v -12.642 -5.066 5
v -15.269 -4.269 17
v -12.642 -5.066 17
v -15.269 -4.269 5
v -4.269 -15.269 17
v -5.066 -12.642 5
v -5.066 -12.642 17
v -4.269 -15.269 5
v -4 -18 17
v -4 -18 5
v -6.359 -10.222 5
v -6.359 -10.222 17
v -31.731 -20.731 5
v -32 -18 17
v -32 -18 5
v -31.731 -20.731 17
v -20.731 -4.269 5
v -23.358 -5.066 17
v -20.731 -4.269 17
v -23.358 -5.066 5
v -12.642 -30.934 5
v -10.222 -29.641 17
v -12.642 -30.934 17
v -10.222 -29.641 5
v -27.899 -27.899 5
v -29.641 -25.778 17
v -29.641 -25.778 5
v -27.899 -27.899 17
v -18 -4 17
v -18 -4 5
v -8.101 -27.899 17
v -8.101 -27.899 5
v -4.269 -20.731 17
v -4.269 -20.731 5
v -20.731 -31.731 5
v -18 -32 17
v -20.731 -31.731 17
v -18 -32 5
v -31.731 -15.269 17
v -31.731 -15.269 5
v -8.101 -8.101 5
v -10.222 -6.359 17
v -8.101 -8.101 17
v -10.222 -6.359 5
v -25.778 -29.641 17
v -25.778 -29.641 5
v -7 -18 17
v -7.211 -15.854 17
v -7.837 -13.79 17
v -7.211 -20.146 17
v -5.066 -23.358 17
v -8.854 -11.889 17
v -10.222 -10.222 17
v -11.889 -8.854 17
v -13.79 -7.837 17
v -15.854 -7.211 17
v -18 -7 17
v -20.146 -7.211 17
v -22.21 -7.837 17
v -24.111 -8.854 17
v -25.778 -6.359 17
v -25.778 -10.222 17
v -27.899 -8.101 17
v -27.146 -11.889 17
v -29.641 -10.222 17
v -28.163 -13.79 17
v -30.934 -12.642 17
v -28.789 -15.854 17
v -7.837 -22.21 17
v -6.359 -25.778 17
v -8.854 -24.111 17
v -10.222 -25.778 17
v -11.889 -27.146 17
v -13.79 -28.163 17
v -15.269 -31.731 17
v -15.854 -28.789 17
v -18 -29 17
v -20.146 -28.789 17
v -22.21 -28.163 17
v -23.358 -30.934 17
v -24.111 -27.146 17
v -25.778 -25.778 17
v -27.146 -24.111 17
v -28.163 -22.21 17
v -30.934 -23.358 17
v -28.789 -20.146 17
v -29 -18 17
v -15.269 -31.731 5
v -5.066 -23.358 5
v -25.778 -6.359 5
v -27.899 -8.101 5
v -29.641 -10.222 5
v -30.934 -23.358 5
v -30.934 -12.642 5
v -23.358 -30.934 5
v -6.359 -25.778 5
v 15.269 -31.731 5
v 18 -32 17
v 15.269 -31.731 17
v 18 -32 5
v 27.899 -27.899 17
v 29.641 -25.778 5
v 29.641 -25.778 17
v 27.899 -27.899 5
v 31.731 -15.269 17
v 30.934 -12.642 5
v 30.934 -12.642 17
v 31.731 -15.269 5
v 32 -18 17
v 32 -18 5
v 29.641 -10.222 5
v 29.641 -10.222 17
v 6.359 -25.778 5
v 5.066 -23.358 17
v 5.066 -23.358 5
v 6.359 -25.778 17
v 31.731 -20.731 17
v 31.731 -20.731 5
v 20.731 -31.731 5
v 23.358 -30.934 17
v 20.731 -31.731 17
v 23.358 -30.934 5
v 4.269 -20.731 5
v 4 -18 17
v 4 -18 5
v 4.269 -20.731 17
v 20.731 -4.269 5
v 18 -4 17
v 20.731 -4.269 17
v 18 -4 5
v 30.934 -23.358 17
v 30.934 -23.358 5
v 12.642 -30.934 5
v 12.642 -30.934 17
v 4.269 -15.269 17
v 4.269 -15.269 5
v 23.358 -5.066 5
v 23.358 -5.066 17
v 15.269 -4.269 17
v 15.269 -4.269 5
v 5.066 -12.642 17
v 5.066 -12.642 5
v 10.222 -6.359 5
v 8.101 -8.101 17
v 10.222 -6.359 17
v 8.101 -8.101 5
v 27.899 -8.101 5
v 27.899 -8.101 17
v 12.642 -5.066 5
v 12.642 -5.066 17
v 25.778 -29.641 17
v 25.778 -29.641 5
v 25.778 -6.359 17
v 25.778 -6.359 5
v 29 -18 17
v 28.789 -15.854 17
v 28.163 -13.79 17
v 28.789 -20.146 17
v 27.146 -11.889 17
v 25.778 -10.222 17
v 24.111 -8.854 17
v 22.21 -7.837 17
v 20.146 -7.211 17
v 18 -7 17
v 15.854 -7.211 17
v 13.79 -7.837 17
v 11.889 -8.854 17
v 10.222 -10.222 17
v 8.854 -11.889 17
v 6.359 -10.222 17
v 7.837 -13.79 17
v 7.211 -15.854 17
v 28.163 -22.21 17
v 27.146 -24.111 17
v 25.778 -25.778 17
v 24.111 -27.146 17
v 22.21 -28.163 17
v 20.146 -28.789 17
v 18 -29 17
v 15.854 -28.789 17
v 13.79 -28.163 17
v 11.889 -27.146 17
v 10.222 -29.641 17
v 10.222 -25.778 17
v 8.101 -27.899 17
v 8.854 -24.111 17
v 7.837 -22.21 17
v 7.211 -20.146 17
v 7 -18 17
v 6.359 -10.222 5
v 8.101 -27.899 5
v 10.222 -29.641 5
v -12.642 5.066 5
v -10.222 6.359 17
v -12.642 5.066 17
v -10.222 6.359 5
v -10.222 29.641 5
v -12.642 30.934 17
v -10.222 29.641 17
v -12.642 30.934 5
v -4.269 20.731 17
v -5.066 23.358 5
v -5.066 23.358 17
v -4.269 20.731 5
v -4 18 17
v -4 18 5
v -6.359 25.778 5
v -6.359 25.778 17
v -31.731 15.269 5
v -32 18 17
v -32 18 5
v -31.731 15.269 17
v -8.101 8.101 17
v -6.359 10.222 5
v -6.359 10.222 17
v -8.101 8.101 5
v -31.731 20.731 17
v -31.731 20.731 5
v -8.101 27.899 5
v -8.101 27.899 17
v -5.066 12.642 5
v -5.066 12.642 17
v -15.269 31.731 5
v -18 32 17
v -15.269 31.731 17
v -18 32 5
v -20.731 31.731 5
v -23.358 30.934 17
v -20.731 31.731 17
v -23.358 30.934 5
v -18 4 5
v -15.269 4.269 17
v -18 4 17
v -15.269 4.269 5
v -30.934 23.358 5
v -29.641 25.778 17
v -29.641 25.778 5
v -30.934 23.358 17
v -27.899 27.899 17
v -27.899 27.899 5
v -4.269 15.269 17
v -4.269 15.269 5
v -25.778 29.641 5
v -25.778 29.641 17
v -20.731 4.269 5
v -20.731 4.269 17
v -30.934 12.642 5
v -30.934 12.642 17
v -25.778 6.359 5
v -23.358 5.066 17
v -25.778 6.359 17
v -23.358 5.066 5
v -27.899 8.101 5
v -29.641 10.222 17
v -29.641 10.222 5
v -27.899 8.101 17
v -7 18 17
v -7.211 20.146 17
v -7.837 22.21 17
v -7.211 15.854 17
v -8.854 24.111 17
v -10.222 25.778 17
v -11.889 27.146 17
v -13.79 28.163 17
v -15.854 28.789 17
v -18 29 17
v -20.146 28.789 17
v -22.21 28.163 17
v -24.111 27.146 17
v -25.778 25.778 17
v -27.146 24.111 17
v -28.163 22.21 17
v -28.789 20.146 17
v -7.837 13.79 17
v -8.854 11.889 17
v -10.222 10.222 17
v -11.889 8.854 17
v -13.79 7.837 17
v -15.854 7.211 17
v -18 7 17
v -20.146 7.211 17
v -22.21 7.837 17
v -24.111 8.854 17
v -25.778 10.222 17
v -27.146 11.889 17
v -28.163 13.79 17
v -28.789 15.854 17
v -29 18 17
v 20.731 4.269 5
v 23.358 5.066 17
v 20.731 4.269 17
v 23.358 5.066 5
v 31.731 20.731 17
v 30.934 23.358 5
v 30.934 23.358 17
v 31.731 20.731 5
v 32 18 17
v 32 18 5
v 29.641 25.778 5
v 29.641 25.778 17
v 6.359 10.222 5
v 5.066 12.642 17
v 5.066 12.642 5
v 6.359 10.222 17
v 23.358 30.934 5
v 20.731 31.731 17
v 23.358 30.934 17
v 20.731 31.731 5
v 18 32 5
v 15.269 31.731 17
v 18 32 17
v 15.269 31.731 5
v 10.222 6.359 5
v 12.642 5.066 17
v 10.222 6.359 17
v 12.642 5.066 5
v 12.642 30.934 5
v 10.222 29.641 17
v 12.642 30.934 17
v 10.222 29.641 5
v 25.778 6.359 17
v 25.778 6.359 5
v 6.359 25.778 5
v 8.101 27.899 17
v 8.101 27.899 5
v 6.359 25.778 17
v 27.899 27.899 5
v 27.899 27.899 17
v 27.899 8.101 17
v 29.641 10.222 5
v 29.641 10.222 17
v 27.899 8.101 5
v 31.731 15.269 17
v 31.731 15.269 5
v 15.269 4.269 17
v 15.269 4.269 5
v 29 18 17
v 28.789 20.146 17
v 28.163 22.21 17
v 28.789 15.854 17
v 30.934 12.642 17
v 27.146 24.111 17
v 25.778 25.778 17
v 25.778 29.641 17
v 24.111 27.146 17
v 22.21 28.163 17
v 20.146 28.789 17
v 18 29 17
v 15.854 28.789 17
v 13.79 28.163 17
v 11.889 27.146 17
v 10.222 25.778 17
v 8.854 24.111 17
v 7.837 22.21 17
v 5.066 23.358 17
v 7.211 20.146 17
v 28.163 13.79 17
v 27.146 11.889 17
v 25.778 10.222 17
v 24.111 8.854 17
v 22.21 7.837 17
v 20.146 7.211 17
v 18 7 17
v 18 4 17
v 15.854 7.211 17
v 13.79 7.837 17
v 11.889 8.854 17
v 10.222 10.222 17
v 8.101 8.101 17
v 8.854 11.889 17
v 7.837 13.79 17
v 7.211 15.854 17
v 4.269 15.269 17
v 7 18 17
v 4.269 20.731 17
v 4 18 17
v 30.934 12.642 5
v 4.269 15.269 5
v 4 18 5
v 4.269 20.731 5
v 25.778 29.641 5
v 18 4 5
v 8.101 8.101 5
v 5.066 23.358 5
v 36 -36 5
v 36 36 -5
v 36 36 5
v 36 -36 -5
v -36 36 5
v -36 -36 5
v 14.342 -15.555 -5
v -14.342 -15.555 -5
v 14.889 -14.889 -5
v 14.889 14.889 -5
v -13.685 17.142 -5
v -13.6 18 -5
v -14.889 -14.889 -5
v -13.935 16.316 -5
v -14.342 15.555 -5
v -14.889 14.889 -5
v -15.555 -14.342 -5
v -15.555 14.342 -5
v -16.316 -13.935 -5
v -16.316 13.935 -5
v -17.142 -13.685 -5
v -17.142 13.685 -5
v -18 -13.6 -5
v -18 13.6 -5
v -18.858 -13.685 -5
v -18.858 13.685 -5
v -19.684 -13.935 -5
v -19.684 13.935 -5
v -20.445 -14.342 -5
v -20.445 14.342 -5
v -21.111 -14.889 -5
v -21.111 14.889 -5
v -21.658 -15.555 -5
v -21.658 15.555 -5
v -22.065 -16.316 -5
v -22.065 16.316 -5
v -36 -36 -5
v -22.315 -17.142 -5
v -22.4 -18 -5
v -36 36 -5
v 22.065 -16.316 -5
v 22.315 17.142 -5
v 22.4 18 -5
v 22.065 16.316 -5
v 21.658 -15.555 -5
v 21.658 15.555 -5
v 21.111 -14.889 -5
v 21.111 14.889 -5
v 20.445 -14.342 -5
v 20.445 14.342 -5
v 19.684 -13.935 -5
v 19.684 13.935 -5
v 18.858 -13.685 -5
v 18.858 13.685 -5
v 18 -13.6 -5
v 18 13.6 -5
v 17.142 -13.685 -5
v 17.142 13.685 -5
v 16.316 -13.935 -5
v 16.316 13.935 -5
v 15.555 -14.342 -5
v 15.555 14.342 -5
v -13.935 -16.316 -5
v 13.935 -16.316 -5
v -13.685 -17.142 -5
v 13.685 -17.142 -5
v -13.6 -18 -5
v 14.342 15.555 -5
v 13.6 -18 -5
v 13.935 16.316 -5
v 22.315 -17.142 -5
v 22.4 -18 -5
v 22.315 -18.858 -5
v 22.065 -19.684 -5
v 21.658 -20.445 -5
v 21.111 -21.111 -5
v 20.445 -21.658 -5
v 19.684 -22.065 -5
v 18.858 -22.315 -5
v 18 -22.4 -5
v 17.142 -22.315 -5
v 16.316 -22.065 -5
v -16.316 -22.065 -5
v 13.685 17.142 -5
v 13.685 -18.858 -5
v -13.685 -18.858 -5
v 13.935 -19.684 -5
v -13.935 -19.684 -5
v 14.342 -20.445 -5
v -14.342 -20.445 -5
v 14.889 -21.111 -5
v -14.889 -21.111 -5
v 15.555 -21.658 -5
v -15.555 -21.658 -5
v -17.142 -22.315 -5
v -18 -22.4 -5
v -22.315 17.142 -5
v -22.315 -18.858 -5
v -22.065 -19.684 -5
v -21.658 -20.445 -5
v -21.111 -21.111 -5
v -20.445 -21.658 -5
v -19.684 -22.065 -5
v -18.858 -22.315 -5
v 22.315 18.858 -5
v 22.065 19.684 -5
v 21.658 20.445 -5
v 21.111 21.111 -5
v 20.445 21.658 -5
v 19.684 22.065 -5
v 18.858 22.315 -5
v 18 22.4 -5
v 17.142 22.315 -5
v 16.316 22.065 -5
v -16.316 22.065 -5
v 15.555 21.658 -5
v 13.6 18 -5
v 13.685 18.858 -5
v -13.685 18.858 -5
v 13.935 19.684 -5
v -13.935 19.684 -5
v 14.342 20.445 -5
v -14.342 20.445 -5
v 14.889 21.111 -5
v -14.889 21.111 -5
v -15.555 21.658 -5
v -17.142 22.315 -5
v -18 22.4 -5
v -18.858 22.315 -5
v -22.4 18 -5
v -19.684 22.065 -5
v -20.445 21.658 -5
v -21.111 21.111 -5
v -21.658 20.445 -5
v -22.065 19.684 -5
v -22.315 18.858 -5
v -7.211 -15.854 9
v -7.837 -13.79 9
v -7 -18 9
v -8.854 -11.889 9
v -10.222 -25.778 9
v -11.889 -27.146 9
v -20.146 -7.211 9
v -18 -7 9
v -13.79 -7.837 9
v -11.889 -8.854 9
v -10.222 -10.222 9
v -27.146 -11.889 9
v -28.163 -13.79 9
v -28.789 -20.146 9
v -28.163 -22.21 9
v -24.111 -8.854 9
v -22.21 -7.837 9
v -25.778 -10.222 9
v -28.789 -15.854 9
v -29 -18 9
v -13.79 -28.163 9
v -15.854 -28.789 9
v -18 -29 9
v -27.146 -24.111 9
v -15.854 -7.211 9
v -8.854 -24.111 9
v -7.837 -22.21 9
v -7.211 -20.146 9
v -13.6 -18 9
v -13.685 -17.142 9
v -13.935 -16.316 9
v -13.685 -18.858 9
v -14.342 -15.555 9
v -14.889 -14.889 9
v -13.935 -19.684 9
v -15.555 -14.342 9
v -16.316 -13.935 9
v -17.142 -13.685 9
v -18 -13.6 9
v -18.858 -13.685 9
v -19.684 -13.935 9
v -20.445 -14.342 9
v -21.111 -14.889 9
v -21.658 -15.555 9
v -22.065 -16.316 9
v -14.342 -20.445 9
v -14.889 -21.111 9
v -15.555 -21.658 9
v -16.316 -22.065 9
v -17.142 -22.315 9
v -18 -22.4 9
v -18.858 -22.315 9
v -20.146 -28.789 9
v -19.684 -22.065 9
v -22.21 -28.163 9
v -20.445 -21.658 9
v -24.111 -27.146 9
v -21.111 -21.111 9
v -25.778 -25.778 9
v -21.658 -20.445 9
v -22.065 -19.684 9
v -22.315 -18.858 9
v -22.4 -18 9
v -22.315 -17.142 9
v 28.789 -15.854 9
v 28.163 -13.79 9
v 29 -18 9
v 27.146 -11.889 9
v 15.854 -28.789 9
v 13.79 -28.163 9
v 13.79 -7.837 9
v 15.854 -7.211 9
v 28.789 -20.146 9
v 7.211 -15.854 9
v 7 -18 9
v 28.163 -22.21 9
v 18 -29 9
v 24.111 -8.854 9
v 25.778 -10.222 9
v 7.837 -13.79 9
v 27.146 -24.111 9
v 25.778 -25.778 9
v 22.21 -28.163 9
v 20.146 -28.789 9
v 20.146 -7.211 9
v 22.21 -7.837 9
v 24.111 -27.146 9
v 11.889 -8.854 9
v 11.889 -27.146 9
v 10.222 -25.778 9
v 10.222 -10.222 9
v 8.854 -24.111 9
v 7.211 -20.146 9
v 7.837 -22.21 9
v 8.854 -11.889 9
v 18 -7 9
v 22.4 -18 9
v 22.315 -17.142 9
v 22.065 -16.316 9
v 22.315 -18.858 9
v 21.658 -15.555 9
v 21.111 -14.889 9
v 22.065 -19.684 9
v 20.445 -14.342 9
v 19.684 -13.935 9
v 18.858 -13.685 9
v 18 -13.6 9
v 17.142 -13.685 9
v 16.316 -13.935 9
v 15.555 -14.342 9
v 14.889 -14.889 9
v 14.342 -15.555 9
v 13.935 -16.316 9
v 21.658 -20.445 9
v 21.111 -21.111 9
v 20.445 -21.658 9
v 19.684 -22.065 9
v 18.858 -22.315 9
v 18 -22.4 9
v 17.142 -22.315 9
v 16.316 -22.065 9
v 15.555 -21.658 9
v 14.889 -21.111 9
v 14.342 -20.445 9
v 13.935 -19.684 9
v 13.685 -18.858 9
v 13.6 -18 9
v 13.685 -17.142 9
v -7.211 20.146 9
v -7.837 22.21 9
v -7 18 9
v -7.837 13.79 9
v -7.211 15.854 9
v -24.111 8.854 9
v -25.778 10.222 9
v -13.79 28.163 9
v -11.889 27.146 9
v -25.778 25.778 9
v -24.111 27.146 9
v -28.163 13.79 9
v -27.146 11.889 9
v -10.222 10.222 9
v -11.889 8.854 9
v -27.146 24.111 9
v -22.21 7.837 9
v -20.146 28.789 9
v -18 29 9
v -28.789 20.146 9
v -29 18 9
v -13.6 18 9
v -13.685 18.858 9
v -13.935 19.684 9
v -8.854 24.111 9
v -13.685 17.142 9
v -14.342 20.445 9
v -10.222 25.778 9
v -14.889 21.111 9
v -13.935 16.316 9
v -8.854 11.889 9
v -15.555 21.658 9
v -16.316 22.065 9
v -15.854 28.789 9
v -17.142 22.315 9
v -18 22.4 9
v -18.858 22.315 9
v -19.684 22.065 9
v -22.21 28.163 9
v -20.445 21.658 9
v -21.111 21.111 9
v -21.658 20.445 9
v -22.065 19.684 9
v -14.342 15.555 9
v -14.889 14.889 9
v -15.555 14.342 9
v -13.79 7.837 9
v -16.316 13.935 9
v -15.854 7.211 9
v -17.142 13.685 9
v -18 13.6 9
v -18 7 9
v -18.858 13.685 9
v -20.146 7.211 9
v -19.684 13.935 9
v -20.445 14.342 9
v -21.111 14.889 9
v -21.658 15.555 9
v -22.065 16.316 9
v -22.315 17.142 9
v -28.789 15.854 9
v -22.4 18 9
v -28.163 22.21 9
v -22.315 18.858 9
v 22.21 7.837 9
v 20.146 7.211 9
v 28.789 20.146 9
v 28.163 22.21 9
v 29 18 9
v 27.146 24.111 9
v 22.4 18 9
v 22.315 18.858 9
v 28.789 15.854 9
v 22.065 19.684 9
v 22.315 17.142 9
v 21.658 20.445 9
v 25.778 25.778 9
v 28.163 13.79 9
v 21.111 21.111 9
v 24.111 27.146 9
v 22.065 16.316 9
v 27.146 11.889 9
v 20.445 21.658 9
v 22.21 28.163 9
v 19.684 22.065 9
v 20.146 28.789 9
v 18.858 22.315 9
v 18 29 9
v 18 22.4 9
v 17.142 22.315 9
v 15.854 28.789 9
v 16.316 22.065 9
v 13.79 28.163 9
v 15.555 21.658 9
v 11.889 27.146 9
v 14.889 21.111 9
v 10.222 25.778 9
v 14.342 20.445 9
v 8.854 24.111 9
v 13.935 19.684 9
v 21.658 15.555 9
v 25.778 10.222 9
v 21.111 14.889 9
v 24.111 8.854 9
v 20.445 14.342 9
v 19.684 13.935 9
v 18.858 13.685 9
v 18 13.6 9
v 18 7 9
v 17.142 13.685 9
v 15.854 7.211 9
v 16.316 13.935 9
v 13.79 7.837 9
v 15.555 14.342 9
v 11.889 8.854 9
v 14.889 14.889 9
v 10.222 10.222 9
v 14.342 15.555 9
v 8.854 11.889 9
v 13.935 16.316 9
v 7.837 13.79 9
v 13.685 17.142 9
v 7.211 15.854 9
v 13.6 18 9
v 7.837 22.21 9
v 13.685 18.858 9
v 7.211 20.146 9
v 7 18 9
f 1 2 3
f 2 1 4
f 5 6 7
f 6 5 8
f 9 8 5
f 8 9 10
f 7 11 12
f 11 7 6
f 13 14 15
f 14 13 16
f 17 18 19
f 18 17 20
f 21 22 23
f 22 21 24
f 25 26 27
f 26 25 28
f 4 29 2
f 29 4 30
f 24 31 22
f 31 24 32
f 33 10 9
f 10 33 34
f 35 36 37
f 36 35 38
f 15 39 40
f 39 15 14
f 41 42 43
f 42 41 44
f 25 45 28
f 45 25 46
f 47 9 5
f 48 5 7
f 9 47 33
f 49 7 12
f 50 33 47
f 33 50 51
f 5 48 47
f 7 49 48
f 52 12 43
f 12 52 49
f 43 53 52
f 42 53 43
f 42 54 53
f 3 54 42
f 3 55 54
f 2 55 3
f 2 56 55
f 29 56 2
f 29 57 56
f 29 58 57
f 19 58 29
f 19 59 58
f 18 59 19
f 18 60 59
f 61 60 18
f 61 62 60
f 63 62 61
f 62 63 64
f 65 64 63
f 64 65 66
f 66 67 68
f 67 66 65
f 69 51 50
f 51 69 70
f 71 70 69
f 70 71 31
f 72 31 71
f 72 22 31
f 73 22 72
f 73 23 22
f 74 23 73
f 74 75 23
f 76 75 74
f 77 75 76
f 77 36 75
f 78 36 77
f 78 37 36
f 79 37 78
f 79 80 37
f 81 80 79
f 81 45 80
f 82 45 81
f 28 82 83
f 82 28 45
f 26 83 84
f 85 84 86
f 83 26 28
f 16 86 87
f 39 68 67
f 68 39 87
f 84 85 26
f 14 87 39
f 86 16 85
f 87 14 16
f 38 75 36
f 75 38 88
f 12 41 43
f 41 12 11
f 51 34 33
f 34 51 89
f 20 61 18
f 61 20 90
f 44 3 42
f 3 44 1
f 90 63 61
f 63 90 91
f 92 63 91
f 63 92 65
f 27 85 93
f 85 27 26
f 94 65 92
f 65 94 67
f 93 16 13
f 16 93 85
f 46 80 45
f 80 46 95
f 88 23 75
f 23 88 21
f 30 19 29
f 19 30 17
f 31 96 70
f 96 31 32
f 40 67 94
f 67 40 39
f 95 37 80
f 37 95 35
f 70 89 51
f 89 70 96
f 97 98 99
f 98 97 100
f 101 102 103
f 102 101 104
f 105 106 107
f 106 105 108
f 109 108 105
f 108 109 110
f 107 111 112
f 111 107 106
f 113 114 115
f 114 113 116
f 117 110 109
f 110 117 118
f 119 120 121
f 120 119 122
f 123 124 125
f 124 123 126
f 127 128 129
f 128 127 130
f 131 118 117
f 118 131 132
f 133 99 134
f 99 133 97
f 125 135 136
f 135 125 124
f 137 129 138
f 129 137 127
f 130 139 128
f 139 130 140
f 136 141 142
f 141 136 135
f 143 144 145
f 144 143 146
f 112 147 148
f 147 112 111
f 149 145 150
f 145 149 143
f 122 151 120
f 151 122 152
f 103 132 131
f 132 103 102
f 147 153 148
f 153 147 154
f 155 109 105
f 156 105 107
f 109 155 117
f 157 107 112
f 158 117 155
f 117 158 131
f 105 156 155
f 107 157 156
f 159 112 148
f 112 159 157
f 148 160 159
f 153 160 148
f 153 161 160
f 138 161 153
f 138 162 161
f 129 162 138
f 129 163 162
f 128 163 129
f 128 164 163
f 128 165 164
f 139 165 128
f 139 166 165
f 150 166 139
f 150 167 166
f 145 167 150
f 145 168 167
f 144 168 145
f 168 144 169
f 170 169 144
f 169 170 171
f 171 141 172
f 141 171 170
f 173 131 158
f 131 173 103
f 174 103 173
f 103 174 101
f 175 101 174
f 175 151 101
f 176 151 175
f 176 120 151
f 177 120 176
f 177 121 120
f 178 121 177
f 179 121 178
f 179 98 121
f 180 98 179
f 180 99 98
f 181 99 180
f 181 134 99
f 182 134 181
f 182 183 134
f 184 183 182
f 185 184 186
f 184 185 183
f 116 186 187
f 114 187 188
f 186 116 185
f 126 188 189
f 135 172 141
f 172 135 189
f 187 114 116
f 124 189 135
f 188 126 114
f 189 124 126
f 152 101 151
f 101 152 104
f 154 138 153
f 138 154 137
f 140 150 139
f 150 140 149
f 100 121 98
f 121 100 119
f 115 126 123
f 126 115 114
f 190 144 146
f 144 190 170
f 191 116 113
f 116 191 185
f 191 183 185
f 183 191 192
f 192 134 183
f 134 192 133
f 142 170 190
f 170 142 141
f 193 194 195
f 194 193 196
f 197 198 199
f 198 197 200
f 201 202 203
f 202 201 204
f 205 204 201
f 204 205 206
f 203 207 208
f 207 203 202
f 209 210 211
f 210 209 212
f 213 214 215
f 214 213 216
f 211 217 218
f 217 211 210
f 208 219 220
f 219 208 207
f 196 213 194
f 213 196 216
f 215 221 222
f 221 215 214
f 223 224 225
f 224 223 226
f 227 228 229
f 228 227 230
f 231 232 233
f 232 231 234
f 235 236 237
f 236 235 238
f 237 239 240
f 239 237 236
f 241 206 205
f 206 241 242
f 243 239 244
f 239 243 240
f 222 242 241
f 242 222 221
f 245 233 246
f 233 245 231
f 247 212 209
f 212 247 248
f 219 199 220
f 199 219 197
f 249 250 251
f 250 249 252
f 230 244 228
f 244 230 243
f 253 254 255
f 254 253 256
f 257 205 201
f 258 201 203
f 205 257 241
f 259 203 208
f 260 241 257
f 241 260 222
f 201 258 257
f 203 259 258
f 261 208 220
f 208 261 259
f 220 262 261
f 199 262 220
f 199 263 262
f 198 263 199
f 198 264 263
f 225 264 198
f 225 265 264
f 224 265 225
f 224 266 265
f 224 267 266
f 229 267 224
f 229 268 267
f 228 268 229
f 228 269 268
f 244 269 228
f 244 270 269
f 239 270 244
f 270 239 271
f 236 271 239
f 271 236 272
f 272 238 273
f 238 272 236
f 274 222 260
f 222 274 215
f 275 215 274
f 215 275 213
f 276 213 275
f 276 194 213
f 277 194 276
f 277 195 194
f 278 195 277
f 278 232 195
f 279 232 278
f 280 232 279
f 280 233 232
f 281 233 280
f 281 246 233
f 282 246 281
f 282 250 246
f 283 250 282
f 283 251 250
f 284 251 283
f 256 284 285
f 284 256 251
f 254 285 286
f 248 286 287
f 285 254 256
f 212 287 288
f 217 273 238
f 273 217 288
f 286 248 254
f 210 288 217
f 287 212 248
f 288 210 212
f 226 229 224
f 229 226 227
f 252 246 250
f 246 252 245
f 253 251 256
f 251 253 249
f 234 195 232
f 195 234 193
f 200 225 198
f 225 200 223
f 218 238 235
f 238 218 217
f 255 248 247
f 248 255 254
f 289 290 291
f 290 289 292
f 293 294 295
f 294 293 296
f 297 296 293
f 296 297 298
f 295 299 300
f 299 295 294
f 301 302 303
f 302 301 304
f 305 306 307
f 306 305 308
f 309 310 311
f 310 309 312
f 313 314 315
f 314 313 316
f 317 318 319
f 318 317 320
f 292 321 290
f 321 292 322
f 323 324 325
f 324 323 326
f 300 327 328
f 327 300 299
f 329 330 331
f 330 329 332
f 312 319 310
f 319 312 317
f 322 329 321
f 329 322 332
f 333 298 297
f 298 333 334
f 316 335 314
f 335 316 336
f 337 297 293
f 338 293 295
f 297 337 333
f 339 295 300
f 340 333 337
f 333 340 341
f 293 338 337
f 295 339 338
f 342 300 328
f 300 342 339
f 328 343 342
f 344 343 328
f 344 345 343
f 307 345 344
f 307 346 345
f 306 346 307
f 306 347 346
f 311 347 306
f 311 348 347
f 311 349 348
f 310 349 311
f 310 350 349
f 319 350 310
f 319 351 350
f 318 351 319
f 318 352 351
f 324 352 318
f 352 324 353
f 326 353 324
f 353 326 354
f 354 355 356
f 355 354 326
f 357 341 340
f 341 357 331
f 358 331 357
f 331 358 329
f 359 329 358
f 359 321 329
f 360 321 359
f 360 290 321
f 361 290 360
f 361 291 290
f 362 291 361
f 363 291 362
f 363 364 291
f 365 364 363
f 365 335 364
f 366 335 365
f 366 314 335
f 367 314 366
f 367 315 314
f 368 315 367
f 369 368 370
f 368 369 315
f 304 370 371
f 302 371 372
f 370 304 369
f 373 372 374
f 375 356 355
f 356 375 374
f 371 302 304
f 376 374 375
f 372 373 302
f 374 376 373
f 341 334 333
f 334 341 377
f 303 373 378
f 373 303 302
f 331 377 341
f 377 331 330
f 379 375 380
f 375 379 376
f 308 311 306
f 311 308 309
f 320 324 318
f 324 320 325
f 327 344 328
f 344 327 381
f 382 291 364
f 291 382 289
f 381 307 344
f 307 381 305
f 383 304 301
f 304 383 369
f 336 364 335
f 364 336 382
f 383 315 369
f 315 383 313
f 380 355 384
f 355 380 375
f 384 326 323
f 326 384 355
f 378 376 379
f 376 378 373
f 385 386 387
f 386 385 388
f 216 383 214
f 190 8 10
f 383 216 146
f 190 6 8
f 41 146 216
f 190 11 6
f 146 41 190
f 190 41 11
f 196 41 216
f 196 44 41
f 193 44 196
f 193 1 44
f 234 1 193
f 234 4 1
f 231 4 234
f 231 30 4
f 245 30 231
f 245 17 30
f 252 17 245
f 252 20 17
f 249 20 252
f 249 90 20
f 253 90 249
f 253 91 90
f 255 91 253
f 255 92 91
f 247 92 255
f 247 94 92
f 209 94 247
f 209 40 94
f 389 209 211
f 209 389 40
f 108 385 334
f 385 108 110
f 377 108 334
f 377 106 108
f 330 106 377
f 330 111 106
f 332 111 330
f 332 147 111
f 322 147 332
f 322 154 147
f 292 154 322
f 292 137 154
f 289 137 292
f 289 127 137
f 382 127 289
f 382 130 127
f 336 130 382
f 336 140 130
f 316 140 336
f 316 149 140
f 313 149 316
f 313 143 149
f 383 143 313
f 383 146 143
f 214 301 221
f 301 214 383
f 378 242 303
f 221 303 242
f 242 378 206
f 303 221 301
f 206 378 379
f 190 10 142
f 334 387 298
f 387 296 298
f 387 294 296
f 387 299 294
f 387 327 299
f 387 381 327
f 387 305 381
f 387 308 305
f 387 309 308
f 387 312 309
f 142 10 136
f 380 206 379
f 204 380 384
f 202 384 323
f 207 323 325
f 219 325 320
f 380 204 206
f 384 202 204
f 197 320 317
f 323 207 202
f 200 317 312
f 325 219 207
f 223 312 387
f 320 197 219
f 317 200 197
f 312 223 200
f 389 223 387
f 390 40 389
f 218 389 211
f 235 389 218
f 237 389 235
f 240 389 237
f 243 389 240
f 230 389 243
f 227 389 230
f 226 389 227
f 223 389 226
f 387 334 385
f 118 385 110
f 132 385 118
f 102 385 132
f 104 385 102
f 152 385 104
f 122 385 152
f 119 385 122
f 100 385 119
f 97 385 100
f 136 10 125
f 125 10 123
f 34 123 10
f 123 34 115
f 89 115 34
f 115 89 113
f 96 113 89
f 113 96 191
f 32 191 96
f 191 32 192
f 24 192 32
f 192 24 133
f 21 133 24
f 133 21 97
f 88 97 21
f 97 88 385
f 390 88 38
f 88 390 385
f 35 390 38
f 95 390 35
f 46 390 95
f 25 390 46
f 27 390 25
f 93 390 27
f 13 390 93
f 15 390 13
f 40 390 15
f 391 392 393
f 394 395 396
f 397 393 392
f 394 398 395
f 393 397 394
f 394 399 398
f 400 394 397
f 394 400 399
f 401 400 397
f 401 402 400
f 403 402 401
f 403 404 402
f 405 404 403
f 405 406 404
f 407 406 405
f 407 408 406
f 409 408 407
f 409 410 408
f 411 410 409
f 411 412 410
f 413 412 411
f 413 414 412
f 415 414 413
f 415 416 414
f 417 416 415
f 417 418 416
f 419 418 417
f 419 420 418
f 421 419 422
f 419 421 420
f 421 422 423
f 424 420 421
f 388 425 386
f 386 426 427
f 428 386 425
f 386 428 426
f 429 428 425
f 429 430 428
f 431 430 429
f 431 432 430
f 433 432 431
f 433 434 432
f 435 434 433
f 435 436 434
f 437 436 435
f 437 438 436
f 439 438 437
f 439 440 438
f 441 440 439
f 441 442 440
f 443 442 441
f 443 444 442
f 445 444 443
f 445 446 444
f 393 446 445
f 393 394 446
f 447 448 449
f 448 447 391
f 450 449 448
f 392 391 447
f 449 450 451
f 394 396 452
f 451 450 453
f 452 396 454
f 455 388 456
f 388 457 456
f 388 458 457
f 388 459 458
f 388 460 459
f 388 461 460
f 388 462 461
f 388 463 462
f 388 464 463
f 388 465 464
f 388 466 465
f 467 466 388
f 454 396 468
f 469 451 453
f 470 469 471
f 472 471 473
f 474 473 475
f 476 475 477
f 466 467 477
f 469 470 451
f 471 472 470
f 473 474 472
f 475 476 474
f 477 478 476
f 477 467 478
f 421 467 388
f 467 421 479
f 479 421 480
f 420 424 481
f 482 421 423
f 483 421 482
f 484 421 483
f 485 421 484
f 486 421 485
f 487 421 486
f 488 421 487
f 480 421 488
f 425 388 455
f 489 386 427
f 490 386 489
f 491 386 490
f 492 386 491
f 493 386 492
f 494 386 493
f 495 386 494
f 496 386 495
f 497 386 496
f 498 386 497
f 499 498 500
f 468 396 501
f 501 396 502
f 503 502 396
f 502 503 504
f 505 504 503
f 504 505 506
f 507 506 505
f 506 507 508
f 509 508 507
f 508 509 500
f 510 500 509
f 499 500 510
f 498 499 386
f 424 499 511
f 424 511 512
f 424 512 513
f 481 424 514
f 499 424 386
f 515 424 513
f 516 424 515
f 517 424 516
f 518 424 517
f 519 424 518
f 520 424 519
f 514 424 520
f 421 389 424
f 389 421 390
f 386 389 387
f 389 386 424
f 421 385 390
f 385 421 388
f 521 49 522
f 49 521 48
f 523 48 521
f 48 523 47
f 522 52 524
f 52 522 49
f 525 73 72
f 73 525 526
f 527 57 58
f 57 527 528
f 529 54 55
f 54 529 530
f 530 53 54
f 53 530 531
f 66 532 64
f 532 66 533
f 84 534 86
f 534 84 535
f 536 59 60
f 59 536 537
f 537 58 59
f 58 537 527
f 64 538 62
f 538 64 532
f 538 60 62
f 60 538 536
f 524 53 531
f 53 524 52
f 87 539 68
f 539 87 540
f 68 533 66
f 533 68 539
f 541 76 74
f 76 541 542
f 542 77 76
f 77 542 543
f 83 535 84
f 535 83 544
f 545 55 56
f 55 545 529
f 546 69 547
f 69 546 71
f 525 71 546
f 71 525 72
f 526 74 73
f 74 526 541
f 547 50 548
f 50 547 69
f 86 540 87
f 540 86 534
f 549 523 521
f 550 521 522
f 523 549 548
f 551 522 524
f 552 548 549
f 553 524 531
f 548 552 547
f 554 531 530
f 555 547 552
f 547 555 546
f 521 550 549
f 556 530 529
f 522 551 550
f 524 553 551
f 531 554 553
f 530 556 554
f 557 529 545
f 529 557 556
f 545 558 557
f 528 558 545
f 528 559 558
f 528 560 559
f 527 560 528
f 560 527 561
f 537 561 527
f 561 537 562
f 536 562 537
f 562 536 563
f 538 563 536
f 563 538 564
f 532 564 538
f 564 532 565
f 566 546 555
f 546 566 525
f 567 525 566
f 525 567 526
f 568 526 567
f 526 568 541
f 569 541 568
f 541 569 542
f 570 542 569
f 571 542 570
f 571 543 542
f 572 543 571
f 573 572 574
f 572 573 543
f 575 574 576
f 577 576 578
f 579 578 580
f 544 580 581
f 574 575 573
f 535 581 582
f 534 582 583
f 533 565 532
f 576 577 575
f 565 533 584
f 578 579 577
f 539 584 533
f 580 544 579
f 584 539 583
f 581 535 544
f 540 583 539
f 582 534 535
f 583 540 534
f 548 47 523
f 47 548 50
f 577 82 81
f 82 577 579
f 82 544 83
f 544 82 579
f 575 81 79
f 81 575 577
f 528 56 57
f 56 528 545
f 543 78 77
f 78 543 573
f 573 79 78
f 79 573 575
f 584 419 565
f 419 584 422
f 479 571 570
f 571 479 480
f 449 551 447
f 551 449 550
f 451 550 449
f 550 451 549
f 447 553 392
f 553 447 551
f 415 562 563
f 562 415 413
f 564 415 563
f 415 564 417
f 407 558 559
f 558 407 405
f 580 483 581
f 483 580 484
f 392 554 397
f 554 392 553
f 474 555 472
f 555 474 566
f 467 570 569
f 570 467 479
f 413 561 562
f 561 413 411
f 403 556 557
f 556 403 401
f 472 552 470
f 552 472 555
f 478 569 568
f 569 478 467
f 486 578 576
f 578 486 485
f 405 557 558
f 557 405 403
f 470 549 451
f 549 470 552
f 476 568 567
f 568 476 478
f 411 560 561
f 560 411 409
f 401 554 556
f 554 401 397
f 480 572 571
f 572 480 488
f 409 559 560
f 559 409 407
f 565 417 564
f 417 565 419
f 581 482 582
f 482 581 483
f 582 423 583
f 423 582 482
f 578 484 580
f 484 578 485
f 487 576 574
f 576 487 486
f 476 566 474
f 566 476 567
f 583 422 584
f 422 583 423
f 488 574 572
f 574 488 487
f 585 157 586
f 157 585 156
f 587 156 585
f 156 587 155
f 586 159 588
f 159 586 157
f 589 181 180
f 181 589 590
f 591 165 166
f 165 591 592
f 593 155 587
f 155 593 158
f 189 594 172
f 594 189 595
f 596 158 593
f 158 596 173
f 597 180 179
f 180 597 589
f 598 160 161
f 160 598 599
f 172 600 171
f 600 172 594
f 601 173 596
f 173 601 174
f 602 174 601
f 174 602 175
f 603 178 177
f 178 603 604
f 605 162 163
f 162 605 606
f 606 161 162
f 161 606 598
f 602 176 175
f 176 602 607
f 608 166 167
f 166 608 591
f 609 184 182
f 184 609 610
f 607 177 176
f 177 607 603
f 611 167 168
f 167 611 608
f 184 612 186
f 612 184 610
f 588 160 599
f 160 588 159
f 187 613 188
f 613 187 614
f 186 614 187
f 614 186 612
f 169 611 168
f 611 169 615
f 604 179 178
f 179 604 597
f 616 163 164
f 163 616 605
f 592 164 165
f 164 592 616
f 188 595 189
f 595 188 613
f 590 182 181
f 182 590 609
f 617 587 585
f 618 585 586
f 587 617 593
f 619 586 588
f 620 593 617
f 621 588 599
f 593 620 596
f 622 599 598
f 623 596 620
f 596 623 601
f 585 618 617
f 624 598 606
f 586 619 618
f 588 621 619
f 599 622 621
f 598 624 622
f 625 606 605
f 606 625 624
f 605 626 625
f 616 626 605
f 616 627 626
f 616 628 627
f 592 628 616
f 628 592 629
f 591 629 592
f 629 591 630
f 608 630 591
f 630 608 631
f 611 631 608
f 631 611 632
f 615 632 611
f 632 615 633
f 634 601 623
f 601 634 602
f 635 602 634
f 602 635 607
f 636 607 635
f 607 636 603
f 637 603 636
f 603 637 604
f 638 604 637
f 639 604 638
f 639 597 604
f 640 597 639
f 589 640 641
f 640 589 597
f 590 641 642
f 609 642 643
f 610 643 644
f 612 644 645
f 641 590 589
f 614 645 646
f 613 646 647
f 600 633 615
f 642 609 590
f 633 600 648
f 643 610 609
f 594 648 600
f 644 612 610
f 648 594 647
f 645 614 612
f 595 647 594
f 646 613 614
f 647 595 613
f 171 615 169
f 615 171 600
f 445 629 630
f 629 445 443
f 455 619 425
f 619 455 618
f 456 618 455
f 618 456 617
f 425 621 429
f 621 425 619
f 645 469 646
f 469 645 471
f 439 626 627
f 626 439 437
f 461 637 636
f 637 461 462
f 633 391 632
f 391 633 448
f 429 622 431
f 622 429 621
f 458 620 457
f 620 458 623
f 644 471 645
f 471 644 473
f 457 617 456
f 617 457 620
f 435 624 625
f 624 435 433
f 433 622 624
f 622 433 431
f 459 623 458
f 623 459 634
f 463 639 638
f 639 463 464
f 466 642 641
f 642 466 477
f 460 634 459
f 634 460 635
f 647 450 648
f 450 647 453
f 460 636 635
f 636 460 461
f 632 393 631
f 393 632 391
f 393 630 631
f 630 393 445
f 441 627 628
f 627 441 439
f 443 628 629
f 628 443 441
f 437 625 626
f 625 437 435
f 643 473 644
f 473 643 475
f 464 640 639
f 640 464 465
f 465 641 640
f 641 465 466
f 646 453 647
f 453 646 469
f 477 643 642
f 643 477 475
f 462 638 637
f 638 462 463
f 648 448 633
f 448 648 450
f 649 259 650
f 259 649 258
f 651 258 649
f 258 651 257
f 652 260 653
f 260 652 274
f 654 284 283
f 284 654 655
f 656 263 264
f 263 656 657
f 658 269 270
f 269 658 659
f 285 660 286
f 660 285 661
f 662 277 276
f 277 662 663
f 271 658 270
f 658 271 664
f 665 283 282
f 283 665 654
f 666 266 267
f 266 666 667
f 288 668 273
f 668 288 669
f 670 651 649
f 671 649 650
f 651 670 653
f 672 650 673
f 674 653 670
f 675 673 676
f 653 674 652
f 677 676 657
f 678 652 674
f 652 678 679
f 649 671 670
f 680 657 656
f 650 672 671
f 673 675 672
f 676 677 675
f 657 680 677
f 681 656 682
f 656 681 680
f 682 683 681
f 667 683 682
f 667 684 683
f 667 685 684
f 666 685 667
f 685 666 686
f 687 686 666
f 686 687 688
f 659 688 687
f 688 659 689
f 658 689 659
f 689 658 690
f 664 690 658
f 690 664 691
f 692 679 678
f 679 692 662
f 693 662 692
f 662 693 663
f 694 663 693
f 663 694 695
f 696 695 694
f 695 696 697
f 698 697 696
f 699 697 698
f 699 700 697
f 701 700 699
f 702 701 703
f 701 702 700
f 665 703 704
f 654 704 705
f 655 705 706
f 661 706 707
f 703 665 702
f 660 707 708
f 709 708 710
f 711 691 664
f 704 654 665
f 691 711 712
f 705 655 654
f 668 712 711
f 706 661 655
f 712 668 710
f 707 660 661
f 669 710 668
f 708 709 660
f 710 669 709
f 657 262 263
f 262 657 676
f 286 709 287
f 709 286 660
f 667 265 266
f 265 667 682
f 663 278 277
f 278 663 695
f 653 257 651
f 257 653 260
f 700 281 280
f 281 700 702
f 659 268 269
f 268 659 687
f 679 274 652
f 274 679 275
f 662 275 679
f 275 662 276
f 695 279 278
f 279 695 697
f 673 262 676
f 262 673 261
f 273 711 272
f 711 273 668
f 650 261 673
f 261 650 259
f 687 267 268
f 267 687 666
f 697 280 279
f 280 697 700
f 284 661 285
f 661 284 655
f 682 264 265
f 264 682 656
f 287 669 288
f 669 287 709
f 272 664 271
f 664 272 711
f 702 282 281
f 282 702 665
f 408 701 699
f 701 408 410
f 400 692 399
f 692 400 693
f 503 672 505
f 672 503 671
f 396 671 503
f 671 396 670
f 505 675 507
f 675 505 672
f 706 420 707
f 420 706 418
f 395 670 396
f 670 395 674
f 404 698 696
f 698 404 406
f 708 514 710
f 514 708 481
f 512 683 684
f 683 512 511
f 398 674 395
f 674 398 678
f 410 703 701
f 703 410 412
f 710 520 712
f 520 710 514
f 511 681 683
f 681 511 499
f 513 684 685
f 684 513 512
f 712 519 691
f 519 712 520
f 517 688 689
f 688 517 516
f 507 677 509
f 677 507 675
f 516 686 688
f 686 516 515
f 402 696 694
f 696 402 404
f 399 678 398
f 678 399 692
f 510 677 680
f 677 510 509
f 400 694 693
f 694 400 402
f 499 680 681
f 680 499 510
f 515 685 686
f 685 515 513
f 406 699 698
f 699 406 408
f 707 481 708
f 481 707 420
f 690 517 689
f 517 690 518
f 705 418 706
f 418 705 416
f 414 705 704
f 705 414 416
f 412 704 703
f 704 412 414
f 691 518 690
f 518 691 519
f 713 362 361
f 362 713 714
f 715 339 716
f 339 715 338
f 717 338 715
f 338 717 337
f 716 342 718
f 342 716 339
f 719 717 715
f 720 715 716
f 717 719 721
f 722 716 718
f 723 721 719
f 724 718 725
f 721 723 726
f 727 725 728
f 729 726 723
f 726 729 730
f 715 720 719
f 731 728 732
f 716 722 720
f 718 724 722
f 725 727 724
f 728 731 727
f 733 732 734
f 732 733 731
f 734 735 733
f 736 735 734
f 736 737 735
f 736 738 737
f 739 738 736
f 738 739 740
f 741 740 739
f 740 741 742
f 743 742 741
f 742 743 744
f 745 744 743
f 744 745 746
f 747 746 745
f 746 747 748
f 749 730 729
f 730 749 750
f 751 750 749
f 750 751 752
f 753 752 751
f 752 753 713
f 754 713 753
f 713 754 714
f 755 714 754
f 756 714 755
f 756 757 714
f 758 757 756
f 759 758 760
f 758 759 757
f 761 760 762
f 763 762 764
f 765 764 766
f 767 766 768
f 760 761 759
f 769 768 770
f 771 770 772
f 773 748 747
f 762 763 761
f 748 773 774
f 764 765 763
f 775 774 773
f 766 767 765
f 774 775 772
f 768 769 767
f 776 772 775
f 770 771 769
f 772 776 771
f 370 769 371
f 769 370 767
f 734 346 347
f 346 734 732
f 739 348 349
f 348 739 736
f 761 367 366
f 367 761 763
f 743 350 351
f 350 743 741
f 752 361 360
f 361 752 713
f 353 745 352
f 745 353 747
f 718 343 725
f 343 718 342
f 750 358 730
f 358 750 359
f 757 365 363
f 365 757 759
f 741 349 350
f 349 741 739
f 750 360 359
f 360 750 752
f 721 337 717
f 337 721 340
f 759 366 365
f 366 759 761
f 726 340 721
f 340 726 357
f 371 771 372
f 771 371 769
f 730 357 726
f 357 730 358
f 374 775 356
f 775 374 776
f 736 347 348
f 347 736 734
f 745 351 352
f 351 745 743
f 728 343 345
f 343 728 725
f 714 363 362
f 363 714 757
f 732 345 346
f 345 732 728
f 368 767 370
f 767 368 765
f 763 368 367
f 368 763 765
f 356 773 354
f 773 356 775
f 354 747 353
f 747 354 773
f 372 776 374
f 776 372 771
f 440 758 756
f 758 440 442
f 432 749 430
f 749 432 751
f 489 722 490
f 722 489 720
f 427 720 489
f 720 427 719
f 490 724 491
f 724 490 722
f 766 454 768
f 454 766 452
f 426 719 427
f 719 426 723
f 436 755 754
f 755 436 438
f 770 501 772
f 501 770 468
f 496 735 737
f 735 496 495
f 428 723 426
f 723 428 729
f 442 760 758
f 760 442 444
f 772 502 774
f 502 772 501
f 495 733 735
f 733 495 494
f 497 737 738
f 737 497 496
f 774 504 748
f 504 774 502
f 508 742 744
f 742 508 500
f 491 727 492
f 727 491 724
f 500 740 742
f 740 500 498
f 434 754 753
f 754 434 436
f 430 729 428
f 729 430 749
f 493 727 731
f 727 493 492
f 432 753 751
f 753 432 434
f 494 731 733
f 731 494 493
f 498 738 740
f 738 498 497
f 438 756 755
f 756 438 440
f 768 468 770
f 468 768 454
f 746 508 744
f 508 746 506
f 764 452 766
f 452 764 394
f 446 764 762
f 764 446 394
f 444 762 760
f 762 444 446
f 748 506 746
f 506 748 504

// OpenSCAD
$fn = 32;

// ----------------------------------------------------------------------
// Socket pad plate
// bosses with counterbored sockets for the screws
// ----------------------------------------------------------------------

// --- parameters (mm) ---
base_t = 10;       // base plate thickness
boss_h = 12;       // boss height above the base plate
boss_d = 28;       // boss diameter
socket_d = 22;     // socket diameter
socket_depth = 8;  // socket depth from the boss face
bolt_d = 8.8;      // screw clearance hole through the socket floor
rows = 2;          // boss rows
cols = 2;          // bosses per row
pitch = 36;        // boss pitch

// --- derived feature positions (mm) ---
height = base_t + boss_h;           // = 22   overall height of the part
plate = [pitch * (cols - 1) + boss_d + 8, pitch * (rows - 1) + boss_d + 8, base_t];  // = [72, 72, 10]   overall size (x, y, z)
span_x = pitch * (cols - 1);        // = 36   distance between outer bosses
span_y = pitch * (rows - 1);        // = 36   distance between boss rows
origin_x = -span_x / 2;             // = -18   X of the first boss
origin_y = -span_y / 2;             // = -18   Y of the first boss
feature_centers = [
  [origin_x + 0 * pitch, origin_y + 0 * pitch],
  [origin_x + 1 * pitch, origin_y + 0 * pitch],
  [origin_x + 0 * pitch, origin_y + 1 * pitch],
  [origin_x + 1 * pitch, origin_y + 1 * pitch]
];   // boss centres: sockets, holes and the pads themselves are placed from here

// base plate, bosses on feature_centers, socket + through hole in each
difference() {
  union() {
    cube(plate, center = true);
    for (centre = feature_centers)
      translate([centre[0], centre[1], plate[2] / 2 - 1])
        cylinder(d = boss_d, h = boss_h + 1);
  }
  for (centre = feature_centers) {
    translate([centre[0], centre[1], plate[2] / 2 + boss_h - socket_depth])
      cylinder(d = socket_d, h = socket_depth + 1);
    translate([centre[0], centre[1], -height])
      cylinder(d = bolt_d, h = 2 * height + 2);  // through the socket floor
  }
}
